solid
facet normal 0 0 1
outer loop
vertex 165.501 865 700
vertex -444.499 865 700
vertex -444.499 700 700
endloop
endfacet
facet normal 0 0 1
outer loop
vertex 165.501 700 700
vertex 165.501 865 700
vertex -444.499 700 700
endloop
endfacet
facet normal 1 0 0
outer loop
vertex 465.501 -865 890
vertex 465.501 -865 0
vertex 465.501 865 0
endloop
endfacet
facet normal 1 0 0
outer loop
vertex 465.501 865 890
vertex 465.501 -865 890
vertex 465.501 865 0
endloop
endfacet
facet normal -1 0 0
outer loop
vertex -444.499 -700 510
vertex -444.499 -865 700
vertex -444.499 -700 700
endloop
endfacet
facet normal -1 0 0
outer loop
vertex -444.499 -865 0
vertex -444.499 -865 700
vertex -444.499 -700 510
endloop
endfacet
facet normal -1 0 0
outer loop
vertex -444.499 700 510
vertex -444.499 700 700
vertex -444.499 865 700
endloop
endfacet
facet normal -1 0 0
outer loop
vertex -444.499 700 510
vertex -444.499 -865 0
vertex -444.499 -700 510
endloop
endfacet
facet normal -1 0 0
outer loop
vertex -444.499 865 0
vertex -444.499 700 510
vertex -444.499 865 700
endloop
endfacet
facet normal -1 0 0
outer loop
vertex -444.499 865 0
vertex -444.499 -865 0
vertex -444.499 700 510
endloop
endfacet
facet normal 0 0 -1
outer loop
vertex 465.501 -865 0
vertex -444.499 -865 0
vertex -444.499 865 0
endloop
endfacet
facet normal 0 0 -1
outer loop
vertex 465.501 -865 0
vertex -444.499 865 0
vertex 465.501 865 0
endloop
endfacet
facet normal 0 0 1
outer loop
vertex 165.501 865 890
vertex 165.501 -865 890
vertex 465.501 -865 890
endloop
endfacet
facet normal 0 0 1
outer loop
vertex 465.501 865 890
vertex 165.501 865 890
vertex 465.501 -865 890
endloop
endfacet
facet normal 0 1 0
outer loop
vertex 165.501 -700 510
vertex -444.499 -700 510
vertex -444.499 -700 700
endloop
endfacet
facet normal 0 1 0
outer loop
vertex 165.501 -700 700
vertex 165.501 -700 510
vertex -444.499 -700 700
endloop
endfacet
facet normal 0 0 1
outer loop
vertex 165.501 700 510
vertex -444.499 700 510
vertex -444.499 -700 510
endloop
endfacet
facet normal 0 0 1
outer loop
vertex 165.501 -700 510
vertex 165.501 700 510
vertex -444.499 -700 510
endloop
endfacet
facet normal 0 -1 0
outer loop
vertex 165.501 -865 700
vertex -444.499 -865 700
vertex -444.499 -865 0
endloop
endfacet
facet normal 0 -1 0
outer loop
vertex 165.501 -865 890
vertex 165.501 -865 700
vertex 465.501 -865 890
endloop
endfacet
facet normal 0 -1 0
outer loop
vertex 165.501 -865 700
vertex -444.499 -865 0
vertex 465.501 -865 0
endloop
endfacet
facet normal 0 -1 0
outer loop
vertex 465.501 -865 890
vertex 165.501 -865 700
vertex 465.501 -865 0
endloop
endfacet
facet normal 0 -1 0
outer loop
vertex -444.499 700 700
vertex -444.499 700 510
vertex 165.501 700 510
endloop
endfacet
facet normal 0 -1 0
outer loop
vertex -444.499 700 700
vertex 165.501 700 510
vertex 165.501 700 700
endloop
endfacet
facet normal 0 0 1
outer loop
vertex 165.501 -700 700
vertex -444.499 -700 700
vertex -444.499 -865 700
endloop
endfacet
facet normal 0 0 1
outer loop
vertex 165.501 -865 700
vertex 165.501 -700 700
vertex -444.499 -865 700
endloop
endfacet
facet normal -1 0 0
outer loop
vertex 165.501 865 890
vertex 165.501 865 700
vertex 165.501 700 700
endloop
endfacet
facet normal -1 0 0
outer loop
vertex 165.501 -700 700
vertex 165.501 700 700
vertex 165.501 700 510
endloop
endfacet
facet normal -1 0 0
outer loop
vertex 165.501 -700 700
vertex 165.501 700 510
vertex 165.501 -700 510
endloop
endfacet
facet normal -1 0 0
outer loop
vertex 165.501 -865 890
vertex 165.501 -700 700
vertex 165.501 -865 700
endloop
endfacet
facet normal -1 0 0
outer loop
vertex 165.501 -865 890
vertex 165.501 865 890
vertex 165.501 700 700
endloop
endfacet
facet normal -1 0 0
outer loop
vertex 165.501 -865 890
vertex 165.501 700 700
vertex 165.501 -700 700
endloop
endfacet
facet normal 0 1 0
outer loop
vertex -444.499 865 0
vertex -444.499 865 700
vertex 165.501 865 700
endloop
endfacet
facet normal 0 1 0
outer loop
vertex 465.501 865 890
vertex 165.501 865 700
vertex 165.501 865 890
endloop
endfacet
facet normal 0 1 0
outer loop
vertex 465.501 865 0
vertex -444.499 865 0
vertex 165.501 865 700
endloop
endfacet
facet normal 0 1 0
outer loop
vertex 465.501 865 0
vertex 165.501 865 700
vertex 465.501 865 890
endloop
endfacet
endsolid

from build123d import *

# Parameters (mm, degrees)
F0_W     = 910
F0_H     = 1730
F1_DEPTH = 890
F2_W     = 1400
F2_H     = 380
F3_DEPTH = 610
F4_W     = 165
F4_H     = 190
F5_DEPTH = 610


with BuildPart() as f1:
    # F0 (on Top) → F1 (new body)
    with BuildSketch(Plane.XY):
        with Locations((10.50148, 0)):
            Rectangle(F0_W, F0_H)
    extrude(amount=F1_DEPTH)

    # F2 (on face) → F3 (cut)
    with BuildSketch(Plane(origin=(-444.49852, 0, 0), x_dir=(0, -1, 0), z_dir=(-1, 0, 0))):
        with Locations((0, 700)):
            Rectangle(F2_W, F2_H)
    extrude(amount=-F3_DEPTH, mode=Mode.SUBTRACT)

    # F4 (on face) → F5 (cut, through all)
    with BuildSketch(Plane(origin=(-444.49852, 0, 0), x_dir=(0, -1, 0), z_dir=(-1, 0, 0))):
        with Locations((-782.5, 795)):
            Rectangle(F4_W, F4_H)
        with Locations((782.5, 795)):
            Rectangle(F4_W, F4_H)
    extrude(amount=-F5_DEPTH, mode=Mode.SUBTRACT)


solid = f1.part
